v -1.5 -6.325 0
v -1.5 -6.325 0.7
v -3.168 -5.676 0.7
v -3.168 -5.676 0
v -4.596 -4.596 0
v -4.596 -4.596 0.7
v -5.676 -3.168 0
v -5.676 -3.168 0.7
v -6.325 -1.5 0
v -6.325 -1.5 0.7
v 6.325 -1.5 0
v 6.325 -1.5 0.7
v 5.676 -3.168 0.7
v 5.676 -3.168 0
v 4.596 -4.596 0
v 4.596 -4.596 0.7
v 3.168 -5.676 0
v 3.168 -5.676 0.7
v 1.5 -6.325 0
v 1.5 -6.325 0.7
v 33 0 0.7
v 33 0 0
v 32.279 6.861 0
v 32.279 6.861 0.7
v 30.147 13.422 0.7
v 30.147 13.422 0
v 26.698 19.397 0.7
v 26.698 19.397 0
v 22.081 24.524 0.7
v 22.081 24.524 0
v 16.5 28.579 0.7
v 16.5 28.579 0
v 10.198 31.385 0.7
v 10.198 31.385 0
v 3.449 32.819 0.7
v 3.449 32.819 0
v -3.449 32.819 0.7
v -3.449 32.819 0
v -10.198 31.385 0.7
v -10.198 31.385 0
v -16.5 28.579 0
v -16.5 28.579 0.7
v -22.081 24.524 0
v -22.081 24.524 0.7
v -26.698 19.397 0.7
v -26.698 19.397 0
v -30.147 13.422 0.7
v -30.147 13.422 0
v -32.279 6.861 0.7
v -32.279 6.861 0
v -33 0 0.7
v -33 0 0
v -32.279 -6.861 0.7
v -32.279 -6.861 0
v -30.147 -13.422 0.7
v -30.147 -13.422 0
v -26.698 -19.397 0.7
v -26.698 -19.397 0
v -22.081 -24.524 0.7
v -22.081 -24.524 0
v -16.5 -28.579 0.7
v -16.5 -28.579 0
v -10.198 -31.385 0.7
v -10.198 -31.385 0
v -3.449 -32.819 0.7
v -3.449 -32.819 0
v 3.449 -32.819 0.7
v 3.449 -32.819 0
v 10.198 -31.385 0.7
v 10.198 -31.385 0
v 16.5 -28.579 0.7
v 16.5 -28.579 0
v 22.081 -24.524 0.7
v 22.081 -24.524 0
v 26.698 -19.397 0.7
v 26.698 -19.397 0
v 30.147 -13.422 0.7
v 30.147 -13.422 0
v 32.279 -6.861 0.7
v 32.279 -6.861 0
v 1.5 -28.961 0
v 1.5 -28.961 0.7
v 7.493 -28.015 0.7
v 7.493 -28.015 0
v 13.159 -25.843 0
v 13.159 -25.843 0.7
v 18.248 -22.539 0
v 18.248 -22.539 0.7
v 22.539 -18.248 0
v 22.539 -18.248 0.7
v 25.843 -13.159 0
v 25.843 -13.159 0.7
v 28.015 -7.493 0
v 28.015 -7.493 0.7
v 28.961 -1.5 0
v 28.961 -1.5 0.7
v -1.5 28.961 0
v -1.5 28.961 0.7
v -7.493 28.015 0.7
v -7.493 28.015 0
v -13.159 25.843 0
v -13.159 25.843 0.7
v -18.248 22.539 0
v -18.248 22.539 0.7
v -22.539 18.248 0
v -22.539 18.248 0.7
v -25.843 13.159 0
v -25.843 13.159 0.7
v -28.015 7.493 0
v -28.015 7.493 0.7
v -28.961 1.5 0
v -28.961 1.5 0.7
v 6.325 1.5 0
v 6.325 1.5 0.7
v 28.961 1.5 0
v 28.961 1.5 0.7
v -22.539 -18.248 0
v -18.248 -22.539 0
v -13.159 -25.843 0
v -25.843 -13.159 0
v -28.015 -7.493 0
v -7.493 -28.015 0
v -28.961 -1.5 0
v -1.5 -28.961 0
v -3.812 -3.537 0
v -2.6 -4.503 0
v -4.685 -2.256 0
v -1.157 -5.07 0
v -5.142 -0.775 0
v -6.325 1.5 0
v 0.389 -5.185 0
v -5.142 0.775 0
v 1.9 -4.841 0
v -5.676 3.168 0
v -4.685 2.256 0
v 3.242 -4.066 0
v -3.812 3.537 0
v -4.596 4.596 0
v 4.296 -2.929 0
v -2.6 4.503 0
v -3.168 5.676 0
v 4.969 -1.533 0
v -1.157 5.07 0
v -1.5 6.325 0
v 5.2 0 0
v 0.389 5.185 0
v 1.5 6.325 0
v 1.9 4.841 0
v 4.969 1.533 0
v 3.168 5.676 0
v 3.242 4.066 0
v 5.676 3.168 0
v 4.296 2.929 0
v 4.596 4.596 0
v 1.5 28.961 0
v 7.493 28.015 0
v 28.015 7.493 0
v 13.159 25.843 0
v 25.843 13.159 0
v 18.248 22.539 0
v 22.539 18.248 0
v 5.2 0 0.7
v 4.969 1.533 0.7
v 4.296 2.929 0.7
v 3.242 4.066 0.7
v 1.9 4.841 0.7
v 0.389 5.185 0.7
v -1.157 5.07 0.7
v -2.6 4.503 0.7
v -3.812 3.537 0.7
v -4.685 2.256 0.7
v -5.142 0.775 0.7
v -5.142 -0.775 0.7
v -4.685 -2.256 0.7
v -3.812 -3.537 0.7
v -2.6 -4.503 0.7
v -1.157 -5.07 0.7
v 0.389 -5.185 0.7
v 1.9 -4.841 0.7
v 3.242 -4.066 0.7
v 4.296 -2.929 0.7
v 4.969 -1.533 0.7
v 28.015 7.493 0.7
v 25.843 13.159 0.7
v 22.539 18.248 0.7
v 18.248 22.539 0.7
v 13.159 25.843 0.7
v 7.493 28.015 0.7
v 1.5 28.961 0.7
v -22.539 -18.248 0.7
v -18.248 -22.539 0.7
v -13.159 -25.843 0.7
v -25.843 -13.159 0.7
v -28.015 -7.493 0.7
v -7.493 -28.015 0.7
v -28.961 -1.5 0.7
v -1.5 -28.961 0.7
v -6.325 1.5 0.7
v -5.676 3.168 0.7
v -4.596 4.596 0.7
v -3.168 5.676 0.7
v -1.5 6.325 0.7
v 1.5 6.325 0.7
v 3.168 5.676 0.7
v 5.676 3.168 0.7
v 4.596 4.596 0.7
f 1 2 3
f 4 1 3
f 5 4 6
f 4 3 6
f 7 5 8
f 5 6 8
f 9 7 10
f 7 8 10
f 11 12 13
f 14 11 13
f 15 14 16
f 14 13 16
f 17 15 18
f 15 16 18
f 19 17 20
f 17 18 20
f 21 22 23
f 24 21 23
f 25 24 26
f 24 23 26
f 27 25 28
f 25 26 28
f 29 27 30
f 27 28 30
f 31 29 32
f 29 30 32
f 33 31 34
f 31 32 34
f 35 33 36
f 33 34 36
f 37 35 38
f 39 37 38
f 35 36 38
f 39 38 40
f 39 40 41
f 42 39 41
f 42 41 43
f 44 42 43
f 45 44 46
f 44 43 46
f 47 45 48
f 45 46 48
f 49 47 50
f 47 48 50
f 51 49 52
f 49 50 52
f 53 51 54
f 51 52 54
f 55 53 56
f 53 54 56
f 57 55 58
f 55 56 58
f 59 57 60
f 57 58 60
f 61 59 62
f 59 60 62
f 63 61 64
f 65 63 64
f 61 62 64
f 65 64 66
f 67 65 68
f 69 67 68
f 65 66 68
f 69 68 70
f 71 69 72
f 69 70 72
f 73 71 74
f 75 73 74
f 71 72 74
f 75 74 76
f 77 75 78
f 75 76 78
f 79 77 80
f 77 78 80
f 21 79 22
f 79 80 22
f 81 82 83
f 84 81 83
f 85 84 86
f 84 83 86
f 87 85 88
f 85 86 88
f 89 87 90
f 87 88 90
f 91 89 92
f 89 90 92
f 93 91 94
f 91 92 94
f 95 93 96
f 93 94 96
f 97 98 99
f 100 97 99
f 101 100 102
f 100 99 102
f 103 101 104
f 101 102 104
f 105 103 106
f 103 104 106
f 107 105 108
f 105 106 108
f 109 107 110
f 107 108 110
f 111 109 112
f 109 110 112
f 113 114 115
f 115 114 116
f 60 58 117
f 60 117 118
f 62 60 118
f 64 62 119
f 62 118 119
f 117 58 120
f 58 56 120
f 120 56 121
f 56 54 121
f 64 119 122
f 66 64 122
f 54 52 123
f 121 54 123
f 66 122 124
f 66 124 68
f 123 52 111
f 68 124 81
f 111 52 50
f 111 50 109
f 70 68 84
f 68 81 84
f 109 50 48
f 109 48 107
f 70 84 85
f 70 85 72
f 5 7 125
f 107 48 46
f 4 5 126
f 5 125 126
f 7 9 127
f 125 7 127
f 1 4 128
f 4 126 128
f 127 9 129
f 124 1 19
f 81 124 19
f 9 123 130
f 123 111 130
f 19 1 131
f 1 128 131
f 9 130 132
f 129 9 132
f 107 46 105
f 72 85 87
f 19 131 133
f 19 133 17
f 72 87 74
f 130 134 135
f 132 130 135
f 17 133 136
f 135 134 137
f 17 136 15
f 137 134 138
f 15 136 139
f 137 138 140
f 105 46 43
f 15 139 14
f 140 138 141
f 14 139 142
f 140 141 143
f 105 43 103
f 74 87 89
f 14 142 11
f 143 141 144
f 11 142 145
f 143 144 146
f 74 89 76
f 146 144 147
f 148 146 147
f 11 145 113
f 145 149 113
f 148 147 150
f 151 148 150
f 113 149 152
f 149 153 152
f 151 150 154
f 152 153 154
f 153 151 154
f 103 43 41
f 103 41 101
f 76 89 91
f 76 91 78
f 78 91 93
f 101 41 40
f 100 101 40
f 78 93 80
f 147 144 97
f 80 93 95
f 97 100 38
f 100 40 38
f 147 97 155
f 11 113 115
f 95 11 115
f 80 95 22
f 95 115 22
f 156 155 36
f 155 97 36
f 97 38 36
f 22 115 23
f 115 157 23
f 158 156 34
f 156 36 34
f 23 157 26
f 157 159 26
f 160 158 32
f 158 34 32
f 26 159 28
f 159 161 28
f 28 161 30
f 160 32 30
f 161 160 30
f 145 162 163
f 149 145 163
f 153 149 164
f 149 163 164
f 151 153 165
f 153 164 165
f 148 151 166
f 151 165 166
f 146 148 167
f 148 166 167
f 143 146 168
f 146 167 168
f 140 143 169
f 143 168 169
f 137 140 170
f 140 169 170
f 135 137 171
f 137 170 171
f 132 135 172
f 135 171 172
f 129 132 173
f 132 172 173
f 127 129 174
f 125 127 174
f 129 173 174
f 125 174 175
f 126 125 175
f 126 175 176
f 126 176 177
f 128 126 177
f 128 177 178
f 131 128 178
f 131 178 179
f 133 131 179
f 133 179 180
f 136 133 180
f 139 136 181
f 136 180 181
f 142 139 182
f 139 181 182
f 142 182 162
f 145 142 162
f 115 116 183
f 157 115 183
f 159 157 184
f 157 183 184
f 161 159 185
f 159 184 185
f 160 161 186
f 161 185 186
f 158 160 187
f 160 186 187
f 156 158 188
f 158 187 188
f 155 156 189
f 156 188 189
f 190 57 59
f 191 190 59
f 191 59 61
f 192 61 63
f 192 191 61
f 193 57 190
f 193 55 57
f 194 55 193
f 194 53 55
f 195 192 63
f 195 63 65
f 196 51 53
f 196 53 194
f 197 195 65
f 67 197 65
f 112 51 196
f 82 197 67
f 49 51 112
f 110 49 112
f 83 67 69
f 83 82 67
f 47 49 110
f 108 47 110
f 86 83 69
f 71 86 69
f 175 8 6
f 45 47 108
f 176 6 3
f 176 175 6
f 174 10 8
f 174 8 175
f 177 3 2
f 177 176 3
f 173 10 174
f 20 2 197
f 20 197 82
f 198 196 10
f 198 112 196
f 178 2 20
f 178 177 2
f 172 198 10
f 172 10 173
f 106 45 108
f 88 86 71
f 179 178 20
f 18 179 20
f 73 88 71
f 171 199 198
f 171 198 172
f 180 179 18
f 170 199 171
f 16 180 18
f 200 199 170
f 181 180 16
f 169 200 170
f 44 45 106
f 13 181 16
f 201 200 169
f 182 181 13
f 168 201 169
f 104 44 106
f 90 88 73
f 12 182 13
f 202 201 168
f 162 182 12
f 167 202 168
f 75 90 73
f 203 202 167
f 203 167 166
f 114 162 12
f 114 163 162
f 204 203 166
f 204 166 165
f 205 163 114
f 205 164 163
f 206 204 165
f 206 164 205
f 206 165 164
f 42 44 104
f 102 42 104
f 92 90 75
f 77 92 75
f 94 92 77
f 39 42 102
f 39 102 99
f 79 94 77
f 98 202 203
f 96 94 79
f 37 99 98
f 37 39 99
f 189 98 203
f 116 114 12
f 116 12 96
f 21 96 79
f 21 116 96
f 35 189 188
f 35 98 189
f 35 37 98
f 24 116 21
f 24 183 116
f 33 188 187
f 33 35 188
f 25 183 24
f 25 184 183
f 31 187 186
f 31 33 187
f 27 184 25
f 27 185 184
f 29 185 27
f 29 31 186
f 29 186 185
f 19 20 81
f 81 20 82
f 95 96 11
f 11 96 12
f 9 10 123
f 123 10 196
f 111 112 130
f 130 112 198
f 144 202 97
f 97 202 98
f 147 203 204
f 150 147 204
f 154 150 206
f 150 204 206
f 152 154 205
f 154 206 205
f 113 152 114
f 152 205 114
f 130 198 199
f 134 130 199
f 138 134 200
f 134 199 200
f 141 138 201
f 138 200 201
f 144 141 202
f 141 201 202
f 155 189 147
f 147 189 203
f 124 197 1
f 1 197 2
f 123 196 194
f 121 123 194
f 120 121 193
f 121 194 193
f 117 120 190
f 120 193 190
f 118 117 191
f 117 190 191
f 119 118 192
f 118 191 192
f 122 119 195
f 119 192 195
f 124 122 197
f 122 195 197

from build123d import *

# Parameters (mm, degrees)
F0_R     = 33
F1_DEPTH = 0.7
F2_R     = 5.2
F3_DEPTH = 0.7
F5_DEPTH = 0.7


with BuildPart() as f1:
    # F0 (on Top) → F1 (new body)
    with BuildSketch(Plane.XY):
        Circle(F0_R)
    extrude(amount=F1_DEPTH)

    # F2 (on face) → F3 (cut, through all)
    with BuildSketch(Plane.XY.offset(0.7)):
        Circle(F2_R)
    extrude(amount=-F3_DEPTH, mode=Mode.SUBTRACT)

    # F4 (on face) → F5 (cut, through all)
    with BuildSketch(Plane.XY.offset(0.7)):
        with BuildLine():
            Line((-1.5, 6.324555), (-1.5, 28.961181))
            ThreePointArc((-1.5, 28.961181), (-20.506097, 20.506097), (-28.961181, 1.5))
            Line((-28.961181, 1.5), (-6.324555, 1.5))
            ThreePointArc((-6.324555, 1.5), (-4.596194, 4.596194), (-1.5, 6.324555))
        make_face()
        with BuildLine():
            Line((6.324555, 1.5), (28.961181, 1.5))
            ThreePointArc((28.961181, 1.5), (20.506097, 20.506097), (1.5, 28.961181))
            Line((1.5, 28.961181), (1.5, 6.324555))
            ThreePointArc((1.5, 6.324555), (4.596194, 4.596194), (6.324555, 1.5))
        make_face()
        with BuildLine():
            ThreePointArc((1.5, -28.961181), (20.506097, -20.506097), (28.961181, -1.5))
            Line((28.961181, -1.5), (6.324555, -1.5))
            ThreePointArc((6.324555, -1.5), (4.596194, -4.596194), (1.5, -6.324555))
            Line((1.5, -6.324555), (1.5, -28.961181))
        make_face()
        with BuildLine():
            ThreePointArc((-28.961181, -1.5), (-20.506097, -20.506097), (-1.5, -28.961181))
            Line((-1.5, -28.961181), (-1.5, -6.324555))
            ThreePointArc((-1.5, -6.324555), (-4.596194, -4.596194), (-6.324555, -1.5))
            Line((-6.324555, -1.5), (-28.961181, -1.5))
        make_face()
    extrude(amount=-F5_DEPTH, mode=Mode.SUBTRACT)


solid = f1.part
